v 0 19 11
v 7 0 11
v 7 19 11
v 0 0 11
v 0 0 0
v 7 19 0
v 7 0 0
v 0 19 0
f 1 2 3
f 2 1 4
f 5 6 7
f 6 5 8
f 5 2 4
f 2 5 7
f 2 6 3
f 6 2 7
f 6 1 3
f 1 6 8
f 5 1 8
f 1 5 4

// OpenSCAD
// Generated by SolidPython 1.0.1 on 2020-07-29 00:46:55


cube(size = [7, 19, 11]);
/***********************************************
*********      SolidPython code:      **********
************************************************
 
# import packages: SolidPython
from solid import *
from solid.utils import *
from itertools import chain, combinations, permutations


class Resize:

    def __init__(self, scad_file):
        self.scad_file = scad_file
        #self.scad_file = import_scad(scad_file)
        # cone/cylinder param:
        self.r1 = 0
        self.r2 = 0
        self.h = 0
        # rectangular prism param:
        self.w = 0
        self.l = 0
        # ellipse param:
        self.r = 0

    # import OpenScad code (file name corresponds to shape)


    # classify shape + parameters
    def assign(self, param1, param2, param3):
        if self.scad_file == 'cone.scad':
            self.r1 = param1
            self.r2 = param2
            self.h = param3
        elif self.scad_file == 'cylinder.scad':
            self.r1 = param1
            self.r2 = param2
            self.h = param3
        elif self.scad_file == 'rectangularPrism.scad':
            self.h = param1
            self.l = param2
            self.w = param3
        else:
            self.r = param1
            self.h = param2

    # resize parameters
    def iterate(self):
        x = range(3, 20, 2)
        i = 1
        if self.scad_file == 'cone.scad':
            tempList = list(permutations(x, 2))
            for temp in tempList:
                param1 = temp[0]
                param2 = temp[1]
                filepath = 'produced_scad_files/' + 'cone' + str(param1) + '_' + str(param2) + '_' + '.scad'
                scad_render_to_file(cylinder(h=param1, r1=param2, r2=0), filepath)

        elif self.scad_file == 'cylinder.scad':
            tempList = list(permutations(x, 3))
            for temp in tempList:
                param1 = temp[0]
                param2 = temp[1]
                filepath = 'produced_scad_files/' + 'cylinder' + str(param1) + '_' + str(param2) + '_' + '.scad'
                scad_render_to_file(cylinder(h=param1, r1=param2, r2=param2), filepath)

        elif self.scad_file == 'rectangularPrism.scad':
            tempList = list(permutations(x, 3))
            for temp in tempList:
                param1 = temp[0]
                param2 = temp[1]
                param3 = temp[2]
                filepath = 'produced_scad_files/' + 'rectangularPrism' + str(param1) + '_' + str(param2) + '_' + str(
                    param3) + '.scad'
                scad_render_to_file(cube(size=(param1, param2, param3)), filepath)

        elif self.scad_file == 'ellipse.scad':
            tempList = list(permutations(x, 4))
            for temp in tempList:
                param1 = temp[0]
                param2 = temp[1]
                param3 = temp[2]
                param4 = temp[3]
                filepath = 'produced_scad_files/' + 'ellipse' + str(param1) + '_' + str(param2) + '_' + str(param3) + '_' + str(param4) + '.scad'
                scad_render_to_file(scale([param1, param2, param3])(sphere(r=param4)), filepath)

    def render_to_scadfile(self):
        scad_render_to_file(scad, 'example.scad') 
 
************************************************/
